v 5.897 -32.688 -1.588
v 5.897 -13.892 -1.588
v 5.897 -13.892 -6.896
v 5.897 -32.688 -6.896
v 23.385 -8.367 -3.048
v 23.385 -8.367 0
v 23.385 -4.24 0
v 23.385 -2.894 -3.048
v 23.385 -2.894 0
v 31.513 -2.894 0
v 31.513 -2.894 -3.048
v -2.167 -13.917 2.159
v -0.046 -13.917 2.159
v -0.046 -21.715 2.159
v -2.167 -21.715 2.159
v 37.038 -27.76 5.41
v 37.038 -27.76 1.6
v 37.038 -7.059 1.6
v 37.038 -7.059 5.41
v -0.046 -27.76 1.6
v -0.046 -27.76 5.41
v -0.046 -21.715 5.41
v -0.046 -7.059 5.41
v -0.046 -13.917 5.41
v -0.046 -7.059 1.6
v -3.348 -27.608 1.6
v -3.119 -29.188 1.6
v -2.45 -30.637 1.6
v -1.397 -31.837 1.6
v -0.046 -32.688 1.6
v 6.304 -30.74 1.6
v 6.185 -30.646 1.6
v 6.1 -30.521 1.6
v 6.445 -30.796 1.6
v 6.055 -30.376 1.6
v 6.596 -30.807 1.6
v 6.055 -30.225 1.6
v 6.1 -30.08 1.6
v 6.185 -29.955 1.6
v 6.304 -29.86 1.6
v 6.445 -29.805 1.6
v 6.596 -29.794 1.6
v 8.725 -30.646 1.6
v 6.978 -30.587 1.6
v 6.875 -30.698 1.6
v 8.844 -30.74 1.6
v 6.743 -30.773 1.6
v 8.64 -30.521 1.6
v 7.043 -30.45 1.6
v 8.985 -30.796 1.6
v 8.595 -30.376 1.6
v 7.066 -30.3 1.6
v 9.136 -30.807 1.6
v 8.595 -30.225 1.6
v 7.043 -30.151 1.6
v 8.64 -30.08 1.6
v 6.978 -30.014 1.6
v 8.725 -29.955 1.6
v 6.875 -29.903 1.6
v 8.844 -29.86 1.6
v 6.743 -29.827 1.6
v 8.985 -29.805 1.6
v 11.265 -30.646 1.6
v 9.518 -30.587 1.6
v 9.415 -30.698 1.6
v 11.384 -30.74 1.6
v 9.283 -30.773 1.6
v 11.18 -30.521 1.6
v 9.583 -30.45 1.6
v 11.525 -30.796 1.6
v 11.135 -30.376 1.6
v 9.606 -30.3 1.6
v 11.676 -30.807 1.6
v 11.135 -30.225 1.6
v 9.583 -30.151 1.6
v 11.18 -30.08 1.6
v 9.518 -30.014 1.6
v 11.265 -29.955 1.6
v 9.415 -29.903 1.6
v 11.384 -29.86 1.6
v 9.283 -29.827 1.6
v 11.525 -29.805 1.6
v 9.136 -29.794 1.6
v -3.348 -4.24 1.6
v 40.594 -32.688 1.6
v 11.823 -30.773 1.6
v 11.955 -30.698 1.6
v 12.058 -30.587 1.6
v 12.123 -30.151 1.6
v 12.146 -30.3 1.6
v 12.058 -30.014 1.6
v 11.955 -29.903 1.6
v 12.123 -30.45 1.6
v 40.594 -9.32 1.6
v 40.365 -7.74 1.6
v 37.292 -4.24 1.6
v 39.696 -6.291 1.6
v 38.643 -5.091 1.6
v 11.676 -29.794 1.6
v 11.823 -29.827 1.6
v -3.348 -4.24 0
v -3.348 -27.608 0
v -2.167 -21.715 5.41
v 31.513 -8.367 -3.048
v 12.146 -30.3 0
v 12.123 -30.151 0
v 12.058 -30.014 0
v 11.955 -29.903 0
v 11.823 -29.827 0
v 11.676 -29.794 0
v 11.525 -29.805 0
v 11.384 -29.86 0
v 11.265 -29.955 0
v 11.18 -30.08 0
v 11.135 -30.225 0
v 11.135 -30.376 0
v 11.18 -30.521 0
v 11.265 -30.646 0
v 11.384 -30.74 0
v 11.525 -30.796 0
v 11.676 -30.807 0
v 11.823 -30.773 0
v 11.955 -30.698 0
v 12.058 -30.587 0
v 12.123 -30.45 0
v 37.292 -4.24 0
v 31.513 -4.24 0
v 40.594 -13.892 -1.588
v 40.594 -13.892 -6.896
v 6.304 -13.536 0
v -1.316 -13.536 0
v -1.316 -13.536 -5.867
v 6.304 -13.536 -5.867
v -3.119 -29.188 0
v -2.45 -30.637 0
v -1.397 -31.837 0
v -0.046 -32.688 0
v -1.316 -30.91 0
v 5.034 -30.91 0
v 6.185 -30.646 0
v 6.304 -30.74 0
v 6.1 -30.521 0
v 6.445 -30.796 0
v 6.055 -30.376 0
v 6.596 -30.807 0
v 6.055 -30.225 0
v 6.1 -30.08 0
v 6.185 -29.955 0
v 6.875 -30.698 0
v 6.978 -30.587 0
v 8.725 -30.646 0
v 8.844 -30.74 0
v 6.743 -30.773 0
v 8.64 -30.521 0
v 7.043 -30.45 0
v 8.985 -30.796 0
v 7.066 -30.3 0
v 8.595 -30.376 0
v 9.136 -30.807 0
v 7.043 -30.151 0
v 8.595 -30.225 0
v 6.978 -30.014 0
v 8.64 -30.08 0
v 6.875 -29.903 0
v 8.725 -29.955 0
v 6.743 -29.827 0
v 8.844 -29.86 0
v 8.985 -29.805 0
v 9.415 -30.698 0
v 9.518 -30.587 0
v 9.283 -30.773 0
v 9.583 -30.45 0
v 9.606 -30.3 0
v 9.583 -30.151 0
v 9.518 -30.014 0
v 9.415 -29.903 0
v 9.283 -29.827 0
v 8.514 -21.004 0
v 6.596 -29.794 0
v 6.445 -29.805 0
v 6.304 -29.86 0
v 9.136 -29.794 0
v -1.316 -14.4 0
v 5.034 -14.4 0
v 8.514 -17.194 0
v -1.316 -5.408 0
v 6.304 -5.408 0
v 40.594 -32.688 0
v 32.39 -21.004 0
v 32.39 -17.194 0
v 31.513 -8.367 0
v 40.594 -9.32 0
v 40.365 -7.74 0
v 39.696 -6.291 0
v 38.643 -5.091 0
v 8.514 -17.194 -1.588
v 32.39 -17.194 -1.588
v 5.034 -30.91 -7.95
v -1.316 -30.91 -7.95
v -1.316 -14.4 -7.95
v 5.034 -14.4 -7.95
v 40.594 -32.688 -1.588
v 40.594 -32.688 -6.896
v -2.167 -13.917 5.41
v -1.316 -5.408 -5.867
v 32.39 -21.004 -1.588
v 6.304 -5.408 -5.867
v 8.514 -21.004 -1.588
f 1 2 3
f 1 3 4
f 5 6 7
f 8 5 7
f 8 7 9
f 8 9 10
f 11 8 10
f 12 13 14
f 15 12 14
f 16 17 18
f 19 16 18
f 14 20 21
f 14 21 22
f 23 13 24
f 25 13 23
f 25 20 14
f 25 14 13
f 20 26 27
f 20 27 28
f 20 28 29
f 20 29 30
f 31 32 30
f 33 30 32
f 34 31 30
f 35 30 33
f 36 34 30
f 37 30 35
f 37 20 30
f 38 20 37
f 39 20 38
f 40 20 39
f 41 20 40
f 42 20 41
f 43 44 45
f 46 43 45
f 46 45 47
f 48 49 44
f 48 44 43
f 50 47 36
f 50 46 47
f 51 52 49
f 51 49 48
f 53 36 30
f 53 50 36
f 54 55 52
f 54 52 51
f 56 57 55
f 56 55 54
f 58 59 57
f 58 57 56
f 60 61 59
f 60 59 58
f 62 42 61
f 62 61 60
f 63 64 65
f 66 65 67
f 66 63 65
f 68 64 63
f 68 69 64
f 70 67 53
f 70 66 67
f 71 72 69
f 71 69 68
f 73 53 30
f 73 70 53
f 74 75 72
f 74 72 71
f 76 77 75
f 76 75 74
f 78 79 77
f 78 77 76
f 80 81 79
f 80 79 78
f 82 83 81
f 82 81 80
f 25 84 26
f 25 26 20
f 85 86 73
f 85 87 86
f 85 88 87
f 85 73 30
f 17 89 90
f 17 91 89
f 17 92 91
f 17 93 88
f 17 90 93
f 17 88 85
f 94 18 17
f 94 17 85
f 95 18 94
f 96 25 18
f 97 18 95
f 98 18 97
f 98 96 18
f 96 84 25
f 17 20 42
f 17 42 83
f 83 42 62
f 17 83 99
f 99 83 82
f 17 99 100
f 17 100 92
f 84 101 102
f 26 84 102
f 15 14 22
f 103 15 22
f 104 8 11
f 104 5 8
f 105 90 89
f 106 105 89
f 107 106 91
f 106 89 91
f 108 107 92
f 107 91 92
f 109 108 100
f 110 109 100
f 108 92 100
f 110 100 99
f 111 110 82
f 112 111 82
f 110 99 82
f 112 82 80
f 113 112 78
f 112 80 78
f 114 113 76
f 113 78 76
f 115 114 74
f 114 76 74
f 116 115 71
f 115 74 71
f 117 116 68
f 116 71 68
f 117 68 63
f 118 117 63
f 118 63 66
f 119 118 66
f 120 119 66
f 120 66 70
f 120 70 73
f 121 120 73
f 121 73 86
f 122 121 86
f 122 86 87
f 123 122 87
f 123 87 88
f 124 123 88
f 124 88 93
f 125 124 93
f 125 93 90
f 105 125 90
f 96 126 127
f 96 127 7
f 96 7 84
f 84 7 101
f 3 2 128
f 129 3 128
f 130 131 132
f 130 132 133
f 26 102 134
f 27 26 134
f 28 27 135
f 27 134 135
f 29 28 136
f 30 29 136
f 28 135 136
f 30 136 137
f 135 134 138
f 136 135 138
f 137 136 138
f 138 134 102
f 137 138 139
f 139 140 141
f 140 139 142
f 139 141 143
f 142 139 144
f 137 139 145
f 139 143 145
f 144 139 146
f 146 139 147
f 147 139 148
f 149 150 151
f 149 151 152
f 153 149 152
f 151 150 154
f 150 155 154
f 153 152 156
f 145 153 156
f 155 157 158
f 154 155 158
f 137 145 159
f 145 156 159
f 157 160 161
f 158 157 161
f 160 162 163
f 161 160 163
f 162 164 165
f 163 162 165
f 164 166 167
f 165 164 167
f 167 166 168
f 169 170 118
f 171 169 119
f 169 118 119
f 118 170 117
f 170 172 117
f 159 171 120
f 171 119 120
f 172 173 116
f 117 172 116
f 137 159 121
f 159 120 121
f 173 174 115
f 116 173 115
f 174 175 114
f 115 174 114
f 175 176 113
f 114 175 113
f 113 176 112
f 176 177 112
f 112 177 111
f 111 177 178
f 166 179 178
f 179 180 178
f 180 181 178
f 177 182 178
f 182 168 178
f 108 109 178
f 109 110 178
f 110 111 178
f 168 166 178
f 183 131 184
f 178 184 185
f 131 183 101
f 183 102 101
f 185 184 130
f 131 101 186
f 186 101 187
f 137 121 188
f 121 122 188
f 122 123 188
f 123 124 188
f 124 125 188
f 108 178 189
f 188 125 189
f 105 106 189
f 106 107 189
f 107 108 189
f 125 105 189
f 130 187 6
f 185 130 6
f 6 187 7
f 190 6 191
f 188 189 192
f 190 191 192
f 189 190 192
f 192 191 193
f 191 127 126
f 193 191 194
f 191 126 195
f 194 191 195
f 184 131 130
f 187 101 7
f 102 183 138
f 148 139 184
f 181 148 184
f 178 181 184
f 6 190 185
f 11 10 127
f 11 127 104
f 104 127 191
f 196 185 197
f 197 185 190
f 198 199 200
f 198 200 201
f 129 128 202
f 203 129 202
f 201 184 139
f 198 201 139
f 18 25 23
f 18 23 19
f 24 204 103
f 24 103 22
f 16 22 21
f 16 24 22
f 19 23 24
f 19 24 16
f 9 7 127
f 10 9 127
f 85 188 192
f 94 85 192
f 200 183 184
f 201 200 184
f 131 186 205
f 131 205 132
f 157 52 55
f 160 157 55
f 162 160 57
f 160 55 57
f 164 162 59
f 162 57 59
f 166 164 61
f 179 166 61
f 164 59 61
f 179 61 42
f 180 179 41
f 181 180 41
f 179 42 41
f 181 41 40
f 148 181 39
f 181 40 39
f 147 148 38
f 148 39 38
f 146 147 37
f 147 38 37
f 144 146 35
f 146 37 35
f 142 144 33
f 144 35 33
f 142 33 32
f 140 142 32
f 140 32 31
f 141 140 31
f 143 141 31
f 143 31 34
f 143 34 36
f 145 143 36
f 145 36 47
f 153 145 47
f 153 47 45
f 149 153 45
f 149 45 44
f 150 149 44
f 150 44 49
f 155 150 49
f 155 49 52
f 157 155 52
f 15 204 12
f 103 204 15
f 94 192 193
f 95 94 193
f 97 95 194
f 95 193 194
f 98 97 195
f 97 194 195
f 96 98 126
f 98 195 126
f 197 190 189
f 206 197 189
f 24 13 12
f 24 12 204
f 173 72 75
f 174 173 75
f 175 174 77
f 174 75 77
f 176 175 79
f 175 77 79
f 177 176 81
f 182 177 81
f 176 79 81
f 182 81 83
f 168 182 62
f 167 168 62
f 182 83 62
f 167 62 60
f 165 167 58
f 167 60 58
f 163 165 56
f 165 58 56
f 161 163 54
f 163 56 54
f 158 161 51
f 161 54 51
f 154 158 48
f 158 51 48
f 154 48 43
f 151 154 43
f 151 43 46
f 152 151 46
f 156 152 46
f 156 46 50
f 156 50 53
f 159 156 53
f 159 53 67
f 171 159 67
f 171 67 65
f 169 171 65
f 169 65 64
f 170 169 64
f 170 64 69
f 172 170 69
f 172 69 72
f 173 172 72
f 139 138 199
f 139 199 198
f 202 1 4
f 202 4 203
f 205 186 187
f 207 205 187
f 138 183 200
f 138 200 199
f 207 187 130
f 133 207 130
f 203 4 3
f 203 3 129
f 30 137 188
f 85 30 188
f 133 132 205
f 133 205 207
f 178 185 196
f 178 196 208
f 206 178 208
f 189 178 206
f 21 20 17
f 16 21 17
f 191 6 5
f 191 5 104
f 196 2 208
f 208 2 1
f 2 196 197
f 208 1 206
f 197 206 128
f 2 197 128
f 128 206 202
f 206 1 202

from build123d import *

# Parameters (mm, degrees)
F1_DEPTH  = 1.6002
F2_W      = 37.084
F2_H      = 20.701
F3_DEPTH  = 3.81
F4_W      = 7.7978
F4_H      = 3.2512
F5_DEPTH  = 2.1209
F6_R      = 0.508
F7_DEPTH  = 25.4
F8_W      = 6.35
F8_H      = 16.51
F9_DEPTH  = 7.9502
F10_W     = 7.62
F10_H     = 8.128
F11_DEPTH = 5.8674
F12_W     = 23.876
F12_H     = 3.81
F13_DEPTH = 1.5875
F14_W     = 8.128
F14_H     = 5.4737
F14_H_2   = 4.1275
F15_DEPTH = 3.048
F16_W     = 34.6964
F16_H     = 18.796
F16_W_2   = 23.876
F16_H_2   = 3.81
F17_DEPTH = 5.3086


with BuildPart() as f1:
    # F0 (on Top) → F1 (new body)
    with BuildSketch(Plane.XY):
        with BuildLine():
            Line((37.2917920684, -4.2399411205), (-3.3482079316, -4.2399411205))
            Line((-3.3482079316, -4.2399411205), (-3.3482079316, -27.6079411205))
            ThreePointArc((-3.3482079316, -27.6079411205), (-2.4501657042, -30.6373636727), (-0.0462079316, -32.6879411205))
            Line((-0.0462079316, -32.6879411205), (40.5937920684, -32.6879411205))
            Line((40.5937920684, -32.6879411205), (40.5937920684, -9.3199411205))
            ThreePointArc((40.5937920684, -9.3199411205), (39.6957498411, -6.2905185683), (37.2917920684, -4.2399411205))
        make_face()
    extrude(amount=F1_DEPTH)

    # F2 (on face) → F3 (join)
    with BuildSketch(Plane.XY.offset(1.6002)):
        with Locations((18.4957920684, -17.4098411205)):
            Rectangle(F2_W, F2_H)
    extrude(amount=F3_DEPTH)

    # F4 (on face) → F5 (join)
    with BuildSketch(Plane(origin=(-0.0462079316, 0, 0), x_dir=(0, -1, 0), z_dir=(-1, 0, 0))):
        with Locations((17.8162411205, 3.7846)):
            Rectangle(F4_W, F4_H)
    extrude(amount=F5_DEPTH)

    # F6 (on face) → F7 (cut)
    with BuildSketch(Plane.XY.offset(1.6002)):
        with Locations((6.5577920684, -30.3003411205)):
            Circle(F6_R)
        with Locations((9.0977920684, -30.3003411205)):
            Circle(F6_R)
        with Locations((11.6377920684, -30.3003411205)):
            Circle(F6_R)
    extrude(amount=-F7_DEPTH, mode=Mode.SUBTRACT)

    # F8 (on face) → F9 (join)
    with BuildSketch(Plane(origin=(0, 0, 0), x_dir=(1, 0, 0), z_dir=(0, 0, -1))):
        with Locations((1.8587920684, 22.6549411205)):
            Rectangle(F8_W, F8_H)
    extrude(amount=F9_DEPTH)

    # F10 (on face) → F11 (join)
    with BuildSketch(Plane(origin=(0, 0, 0), x_dir=(1, 0, 0), z_dir=(0, 0, -1))):
        with Locations((2.4937920684, 9.4723411205)):
            Rectangle(F10_W, F10_H)
    extrude(amount=F11_DEPTH)

    # F12 (on face) → F13 (join)
    with BuildSketch(Plane(origin=(0, 0, 0), x_dir=(1, 0, 0), z_dir=(0, 0, -1))):
        with Locations((20.4515920684, 19.0989411205)):
            Rectangle(F12_W, F12_H)
    extrude(amount=F13_DEPTH)

    # F14 (on face) → F15 (join)
    with BuildSketch(Plane(origin=(0, 0, 0), x_dir=(1, 0, 0), z_dir=(0, 0, -1))):
        with Locations((27.4492920684, 5.6305911205)):
            Rectangle(F14_W, F14_H)
        with Locations((27.4492920684, 6.3036911205)):
            Rectangle(F14_W, F14_H_2)
    extrude(amount=F15_DEPTH)

    # F16 (on face) → F17 (join)
    with BuildSketch(Plane(origin=(0, 0, -1.5875), x_dir=(1, 0, 0), z_dir=(0, 0, -1))):
        with Locations((23.2455920684, 23.2899411205)):
            Rectangle(F16_W, F16_H)
        with Locations((20.4515920684, 19.0989411205)):
            Rectangle(F16_W_2, F16_H_2, mode=Mode.SUBTRACT)
        with Locations((23.2455920684, 23.2899411205)):
            Rectangle(F16_W, F16_H)
    extrude(amount=F17_DEPTH)


solid = f1.part
